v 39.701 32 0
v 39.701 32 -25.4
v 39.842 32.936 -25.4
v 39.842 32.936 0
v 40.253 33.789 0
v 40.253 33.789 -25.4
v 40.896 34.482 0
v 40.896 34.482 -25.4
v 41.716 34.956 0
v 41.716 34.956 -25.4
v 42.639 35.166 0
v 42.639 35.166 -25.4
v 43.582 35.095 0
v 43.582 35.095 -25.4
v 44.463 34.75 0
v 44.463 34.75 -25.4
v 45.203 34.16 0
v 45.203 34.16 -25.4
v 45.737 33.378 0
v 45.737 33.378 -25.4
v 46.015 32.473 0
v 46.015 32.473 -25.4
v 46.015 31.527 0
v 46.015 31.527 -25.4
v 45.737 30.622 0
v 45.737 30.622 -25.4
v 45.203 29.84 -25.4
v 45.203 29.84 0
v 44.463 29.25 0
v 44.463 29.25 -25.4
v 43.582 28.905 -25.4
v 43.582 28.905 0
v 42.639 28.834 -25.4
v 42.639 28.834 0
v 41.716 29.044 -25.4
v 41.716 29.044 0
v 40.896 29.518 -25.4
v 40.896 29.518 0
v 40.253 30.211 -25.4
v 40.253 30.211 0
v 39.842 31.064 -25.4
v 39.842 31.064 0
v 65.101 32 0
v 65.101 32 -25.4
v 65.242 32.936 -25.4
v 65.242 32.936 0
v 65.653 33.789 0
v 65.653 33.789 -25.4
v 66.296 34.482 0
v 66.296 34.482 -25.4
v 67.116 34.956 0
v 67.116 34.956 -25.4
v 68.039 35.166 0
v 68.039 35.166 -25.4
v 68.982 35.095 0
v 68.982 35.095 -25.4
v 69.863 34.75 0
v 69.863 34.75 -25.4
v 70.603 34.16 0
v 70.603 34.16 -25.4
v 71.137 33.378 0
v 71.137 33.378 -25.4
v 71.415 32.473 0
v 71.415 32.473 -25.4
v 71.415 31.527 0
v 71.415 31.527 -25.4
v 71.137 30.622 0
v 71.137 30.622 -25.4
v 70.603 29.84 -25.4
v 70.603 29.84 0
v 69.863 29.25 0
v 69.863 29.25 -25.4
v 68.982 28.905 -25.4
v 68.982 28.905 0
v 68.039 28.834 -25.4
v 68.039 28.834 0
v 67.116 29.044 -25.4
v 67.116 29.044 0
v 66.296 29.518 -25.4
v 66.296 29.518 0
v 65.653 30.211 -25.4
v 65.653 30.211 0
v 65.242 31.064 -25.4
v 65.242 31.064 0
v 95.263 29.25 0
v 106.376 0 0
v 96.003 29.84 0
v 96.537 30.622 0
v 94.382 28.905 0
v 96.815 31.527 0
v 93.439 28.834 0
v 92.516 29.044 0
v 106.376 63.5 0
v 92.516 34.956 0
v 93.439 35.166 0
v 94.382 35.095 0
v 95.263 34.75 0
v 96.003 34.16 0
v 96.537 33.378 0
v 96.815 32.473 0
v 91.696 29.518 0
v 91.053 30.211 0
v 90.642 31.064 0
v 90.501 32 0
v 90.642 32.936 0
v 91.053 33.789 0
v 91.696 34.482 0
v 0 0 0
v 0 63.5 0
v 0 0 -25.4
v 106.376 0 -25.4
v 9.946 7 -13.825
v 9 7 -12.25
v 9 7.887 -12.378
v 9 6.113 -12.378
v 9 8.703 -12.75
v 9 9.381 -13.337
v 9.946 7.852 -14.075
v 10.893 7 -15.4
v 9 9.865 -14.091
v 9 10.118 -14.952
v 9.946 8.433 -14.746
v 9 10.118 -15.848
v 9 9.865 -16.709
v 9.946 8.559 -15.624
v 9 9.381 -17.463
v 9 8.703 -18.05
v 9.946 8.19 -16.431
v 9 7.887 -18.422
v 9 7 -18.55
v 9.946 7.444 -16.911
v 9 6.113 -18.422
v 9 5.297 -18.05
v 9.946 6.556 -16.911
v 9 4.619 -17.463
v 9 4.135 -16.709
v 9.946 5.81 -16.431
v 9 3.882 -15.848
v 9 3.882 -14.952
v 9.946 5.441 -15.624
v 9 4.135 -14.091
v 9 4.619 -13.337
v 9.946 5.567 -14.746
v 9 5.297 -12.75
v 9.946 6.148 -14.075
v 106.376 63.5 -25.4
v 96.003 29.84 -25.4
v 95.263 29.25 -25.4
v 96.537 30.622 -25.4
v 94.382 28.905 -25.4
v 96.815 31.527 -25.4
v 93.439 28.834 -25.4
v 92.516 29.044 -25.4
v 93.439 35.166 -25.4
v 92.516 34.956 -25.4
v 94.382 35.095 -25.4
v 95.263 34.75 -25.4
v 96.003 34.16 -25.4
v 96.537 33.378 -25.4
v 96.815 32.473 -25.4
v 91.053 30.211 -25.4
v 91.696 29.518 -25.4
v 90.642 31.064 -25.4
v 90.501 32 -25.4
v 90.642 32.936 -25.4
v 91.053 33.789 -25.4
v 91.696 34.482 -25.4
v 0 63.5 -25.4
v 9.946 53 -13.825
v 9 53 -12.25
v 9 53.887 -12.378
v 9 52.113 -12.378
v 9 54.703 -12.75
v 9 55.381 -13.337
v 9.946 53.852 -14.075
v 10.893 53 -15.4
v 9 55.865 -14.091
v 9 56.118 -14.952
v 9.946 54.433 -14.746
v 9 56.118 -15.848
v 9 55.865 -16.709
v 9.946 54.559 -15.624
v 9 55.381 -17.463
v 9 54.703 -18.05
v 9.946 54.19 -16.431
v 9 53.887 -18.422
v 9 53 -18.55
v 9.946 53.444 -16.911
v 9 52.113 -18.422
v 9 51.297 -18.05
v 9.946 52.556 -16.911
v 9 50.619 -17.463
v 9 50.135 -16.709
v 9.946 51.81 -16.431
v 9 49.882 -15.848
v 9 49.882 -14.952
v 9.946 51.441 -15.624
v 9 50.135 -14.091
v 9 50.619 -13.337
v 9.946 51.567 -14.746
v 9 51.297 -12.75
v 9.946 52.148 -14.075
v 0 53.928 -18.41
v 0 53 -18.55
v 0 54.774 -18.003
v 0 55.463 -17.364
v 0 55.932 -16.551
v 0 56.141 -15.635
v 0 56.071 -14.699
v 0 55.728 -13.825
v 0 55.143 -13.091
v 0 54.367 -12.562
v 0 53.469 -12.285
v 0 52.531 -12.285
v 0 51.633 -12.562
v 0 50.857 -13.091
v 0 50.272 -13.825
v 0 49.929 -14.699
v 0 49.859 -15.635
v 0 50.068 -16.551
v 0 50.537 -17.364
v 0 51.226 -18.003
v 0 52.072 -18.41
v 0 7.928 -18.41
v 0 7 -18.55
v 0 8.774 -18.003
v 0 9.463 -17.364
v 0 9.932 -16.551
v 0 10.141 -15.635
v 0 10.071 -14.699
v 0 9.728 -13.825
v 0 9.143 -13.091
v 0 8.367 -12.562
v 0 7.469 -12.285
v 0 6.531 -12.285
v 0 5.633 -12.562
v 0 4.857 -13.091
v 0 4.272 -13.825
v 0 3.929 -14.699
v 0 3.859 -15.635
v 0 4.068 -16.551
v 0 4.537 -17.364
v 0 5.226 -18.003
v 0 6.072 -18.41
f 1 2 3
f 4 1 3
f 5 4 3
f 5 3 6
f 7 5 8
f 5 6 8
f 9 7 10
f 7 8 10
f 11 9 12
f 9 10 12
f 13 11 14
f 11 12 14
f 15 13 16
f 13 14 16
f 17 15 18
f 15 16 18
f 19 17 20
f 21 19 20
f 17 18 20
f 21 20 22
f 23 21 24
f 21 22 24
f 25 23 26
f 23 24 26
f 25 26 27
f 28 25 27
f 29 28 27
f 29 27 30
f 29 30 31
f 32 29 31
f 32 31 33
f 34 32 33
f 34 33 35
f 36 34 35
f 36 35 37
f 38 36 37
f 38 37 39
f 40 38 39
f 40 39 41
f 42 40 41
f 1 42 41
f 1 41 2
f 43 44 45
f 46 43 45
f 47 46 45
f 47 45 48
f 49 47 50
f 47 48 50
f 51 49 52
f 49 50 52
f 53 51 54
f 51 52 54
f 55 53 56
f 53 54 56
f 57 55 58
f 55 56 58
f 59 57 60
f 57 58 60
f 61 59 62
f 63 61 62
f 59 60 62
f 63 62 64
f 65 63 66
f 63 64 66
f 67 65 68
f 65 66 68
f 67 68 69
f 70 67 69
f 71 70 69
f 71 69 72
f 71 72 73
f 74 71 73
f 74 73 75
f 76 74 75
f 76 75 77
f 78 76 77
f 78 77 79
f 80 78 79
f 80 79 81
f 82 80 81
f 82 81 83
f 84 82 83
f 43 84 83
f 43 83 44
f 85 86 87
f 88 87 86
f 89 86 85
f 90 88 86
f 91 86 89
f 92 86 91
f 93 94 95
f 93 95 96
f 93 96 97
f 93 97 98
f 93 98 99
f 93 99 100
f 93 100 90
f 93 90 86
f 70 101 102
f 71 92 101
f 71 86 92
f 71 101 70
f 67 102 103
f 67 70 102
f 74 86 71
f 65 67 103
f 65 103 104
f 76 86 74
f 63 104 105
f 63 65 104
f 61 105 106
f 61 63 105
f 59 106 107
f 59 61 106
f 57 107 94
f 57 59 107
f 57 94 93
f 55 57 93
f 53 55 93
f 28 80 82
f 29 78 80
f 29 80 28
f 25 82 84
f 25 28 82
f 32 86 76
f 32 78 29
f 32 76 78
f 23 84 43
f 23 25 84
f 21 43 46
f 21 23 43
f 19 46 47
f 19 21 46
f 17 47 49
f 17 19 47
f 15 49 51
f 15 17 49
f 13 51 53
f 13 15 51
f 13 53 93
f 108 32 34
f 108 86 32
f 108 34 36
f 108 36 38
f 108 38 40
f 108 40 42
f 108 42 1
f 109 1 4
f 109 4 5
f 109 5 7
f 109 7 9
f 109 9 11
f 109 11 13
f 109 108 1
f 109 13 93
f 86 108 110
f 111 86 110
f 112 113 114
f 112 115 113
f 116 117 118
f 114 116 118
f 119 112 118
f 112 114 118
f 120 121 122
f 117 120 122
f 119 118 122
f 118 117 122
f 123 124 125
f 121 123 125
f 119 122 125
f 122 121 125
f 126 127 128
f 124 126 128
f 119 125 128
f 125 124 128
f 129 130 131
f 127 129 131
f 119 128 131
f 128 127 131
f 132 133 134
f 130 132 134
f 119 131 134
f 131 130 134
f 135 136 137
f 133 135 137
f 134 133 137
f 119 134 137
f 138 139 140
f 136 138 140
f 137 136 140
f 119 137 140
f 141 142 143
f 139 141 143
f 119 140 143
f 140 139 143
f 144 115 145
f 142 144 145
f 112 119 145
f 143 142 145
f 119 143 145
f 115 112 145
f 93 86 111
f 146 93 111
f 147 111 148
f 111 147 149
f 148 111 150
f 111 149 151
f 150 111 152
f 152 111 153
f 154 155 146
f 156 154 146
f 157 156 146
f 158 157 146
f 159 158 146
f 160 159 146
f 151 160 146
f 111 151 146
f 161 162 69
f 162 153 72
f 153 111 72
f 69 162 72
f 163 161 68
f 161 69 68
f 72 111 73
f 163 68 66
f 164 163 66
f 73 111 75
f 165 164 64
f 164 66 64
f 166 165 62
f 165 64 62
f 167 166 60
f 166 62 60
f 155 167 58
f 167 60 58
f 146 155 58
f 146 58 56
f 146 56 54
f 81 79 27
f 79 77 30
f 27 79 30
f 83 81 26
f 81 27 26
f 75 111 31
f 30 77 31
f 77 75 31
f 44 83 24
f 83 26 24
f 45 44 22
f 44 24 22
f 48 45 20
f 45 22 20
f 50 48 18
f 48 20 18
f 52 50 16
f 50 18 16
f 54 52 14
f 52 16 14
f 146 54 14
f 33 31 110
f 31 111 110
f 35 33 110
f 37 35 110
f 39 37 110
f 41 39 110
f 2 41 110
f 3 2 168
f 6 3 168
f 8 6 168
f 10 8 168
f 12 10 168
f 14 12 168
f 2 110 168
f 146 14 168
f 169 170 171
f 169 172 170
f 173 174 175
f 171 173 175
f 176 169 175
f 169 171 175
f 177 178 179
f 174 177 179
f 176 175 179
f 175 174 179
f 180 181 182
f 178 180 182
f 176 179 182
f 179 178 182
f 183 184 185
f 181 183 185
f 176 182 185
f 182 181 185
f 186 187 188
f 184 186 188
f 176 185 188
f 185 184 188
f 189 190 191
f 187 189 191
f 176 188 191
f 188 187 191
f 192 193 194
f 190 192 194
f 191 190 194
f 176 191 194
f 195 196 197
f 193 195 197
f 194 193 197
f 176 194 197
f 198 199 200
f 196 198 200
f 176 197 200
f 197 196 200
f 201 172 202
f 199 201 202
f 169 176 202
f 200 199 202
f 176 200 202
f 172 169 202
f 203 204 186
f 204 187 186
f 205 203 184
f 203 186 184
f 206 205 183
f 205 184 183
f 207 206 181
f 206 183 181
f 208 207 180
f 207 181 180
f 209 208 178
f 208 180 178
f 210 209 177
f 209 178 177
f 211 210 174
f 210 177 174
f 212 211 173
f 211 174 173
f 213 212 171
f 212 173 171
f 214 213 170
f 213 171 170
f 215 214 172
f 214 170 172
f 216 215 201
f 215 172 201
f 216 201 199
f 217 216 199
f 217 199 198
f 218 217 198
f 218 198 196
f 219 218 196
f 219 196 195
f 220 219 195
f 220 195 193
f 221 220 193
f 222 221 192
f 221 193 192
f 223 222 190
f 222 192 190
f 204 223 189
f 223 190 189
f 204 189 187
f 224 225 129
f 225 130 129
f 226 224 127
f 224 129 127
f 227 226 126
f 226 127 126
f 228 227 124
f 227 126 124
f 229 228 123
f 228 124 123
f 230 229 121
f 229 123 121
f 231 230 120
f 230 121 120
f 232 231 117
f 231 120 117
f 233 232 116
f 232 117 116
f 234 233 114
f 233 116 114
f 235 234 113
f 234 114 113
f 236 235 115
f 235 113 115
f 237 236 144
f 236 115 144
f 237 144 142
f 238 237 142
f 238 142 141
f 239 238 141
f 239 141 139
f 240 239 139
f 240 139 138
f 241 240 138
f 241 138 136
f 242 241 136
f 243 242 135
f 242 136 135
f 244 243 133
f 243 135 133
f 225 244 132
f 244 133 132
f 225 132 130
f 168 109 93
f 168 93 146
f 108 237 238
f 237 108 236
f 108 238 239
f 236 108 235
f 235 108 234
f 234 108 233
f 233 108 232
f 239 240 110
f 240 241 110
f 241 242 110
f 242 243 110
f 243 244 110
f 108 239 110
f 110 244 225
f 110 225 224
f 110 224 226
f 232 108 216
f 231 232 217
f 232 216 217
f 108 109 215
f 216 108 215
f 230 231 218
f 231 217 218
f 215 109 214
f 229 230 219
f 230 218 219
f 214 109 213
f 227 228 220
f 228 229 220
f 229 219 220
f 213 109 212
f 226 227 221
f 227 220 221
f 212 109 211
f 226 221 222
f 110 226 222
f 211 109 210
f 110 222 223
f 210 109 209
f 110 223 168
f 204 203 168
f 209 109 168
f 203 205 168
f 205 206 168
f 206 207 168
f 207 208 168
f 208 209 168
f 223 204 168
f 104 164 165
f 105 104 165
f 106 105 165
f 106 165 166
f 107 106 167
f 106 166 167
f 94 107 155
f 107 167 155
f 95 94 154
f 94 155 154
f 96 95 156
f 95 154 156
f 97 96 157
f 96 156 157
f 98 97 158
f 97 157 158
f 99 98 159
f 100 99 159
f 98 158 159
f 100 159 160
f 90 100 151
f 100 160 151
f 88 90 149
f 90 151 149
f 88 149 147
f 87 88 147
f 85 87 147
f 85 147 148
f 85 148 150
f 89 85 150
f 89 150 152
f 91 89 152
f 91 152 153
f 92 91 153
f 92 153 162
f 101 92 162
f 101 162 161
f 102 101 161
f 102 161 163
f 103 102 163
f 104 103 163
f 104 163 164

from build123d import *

# Parameters (mm, degrees)
SKETCH1_W                   = 25.4
SKETCH1_H                   = 63.5
BOSS_EXTRUDE1_DEPTH         = 106.37596
F_1_4_0_25_DIAMETER_HOLE1_D = 6.35
F_6_0MM_DOWEL_HOLE1_D       = 6.3
F_6_0MM_DOWEL_HOLE1_DEPTH   = 9.0000074
F_6_0MM_DOWEL_HOLE1_TIP     = 1.89271095


with BuildPart() as part:
    # Sketch1 → Boss-Extrude1 (new body)
    with BuildSketch(Plane(origin=(0, 0, 0), x_dir=(0, 0, -1), z_dir=(1, 0, 0))):
        with Locations((12.7, 31.75)):
            Rectangle(SKETCH1_W, SKETCH1_H)
    extrude(amount=BOSS_EXTRUDE1_DEPTH)

    # 1/4 (0.25) Diameter Hole1 (through all)
    with Locations(Plane.XY):
        with Locations((42.87596001, 32), (93.67596001, 32), (68.27596001, 32)):
            Hole(F_1_4_0_25_DIAMETER_HOLE1_D / 2)

    # Ø6.0mm Dowel Hole1
    with Locations(Plane.ZY):
        with Locations((-15.4, 7), (-15.4, 53)):
            Hole(F_6_0MM_DOWEL_HOLE1_D / 2, depth=F_6_0MM_DOWEL_HOLE1_DEPTH)
            with Locations((0, 0, -(F_6_0MM_DOWEL_HOLE1_DEPTH + F_6_0MM_DOWEL_HOLE1_TIP / 2))):  # 118° drill point
                Cone(0, F_6_0MM_DOWEL_HOLE1_D / 2, F_6_0MM_DOWEL_HOLE1_TIP, mode=Mode.SUBTRACT)


solid = part.part
